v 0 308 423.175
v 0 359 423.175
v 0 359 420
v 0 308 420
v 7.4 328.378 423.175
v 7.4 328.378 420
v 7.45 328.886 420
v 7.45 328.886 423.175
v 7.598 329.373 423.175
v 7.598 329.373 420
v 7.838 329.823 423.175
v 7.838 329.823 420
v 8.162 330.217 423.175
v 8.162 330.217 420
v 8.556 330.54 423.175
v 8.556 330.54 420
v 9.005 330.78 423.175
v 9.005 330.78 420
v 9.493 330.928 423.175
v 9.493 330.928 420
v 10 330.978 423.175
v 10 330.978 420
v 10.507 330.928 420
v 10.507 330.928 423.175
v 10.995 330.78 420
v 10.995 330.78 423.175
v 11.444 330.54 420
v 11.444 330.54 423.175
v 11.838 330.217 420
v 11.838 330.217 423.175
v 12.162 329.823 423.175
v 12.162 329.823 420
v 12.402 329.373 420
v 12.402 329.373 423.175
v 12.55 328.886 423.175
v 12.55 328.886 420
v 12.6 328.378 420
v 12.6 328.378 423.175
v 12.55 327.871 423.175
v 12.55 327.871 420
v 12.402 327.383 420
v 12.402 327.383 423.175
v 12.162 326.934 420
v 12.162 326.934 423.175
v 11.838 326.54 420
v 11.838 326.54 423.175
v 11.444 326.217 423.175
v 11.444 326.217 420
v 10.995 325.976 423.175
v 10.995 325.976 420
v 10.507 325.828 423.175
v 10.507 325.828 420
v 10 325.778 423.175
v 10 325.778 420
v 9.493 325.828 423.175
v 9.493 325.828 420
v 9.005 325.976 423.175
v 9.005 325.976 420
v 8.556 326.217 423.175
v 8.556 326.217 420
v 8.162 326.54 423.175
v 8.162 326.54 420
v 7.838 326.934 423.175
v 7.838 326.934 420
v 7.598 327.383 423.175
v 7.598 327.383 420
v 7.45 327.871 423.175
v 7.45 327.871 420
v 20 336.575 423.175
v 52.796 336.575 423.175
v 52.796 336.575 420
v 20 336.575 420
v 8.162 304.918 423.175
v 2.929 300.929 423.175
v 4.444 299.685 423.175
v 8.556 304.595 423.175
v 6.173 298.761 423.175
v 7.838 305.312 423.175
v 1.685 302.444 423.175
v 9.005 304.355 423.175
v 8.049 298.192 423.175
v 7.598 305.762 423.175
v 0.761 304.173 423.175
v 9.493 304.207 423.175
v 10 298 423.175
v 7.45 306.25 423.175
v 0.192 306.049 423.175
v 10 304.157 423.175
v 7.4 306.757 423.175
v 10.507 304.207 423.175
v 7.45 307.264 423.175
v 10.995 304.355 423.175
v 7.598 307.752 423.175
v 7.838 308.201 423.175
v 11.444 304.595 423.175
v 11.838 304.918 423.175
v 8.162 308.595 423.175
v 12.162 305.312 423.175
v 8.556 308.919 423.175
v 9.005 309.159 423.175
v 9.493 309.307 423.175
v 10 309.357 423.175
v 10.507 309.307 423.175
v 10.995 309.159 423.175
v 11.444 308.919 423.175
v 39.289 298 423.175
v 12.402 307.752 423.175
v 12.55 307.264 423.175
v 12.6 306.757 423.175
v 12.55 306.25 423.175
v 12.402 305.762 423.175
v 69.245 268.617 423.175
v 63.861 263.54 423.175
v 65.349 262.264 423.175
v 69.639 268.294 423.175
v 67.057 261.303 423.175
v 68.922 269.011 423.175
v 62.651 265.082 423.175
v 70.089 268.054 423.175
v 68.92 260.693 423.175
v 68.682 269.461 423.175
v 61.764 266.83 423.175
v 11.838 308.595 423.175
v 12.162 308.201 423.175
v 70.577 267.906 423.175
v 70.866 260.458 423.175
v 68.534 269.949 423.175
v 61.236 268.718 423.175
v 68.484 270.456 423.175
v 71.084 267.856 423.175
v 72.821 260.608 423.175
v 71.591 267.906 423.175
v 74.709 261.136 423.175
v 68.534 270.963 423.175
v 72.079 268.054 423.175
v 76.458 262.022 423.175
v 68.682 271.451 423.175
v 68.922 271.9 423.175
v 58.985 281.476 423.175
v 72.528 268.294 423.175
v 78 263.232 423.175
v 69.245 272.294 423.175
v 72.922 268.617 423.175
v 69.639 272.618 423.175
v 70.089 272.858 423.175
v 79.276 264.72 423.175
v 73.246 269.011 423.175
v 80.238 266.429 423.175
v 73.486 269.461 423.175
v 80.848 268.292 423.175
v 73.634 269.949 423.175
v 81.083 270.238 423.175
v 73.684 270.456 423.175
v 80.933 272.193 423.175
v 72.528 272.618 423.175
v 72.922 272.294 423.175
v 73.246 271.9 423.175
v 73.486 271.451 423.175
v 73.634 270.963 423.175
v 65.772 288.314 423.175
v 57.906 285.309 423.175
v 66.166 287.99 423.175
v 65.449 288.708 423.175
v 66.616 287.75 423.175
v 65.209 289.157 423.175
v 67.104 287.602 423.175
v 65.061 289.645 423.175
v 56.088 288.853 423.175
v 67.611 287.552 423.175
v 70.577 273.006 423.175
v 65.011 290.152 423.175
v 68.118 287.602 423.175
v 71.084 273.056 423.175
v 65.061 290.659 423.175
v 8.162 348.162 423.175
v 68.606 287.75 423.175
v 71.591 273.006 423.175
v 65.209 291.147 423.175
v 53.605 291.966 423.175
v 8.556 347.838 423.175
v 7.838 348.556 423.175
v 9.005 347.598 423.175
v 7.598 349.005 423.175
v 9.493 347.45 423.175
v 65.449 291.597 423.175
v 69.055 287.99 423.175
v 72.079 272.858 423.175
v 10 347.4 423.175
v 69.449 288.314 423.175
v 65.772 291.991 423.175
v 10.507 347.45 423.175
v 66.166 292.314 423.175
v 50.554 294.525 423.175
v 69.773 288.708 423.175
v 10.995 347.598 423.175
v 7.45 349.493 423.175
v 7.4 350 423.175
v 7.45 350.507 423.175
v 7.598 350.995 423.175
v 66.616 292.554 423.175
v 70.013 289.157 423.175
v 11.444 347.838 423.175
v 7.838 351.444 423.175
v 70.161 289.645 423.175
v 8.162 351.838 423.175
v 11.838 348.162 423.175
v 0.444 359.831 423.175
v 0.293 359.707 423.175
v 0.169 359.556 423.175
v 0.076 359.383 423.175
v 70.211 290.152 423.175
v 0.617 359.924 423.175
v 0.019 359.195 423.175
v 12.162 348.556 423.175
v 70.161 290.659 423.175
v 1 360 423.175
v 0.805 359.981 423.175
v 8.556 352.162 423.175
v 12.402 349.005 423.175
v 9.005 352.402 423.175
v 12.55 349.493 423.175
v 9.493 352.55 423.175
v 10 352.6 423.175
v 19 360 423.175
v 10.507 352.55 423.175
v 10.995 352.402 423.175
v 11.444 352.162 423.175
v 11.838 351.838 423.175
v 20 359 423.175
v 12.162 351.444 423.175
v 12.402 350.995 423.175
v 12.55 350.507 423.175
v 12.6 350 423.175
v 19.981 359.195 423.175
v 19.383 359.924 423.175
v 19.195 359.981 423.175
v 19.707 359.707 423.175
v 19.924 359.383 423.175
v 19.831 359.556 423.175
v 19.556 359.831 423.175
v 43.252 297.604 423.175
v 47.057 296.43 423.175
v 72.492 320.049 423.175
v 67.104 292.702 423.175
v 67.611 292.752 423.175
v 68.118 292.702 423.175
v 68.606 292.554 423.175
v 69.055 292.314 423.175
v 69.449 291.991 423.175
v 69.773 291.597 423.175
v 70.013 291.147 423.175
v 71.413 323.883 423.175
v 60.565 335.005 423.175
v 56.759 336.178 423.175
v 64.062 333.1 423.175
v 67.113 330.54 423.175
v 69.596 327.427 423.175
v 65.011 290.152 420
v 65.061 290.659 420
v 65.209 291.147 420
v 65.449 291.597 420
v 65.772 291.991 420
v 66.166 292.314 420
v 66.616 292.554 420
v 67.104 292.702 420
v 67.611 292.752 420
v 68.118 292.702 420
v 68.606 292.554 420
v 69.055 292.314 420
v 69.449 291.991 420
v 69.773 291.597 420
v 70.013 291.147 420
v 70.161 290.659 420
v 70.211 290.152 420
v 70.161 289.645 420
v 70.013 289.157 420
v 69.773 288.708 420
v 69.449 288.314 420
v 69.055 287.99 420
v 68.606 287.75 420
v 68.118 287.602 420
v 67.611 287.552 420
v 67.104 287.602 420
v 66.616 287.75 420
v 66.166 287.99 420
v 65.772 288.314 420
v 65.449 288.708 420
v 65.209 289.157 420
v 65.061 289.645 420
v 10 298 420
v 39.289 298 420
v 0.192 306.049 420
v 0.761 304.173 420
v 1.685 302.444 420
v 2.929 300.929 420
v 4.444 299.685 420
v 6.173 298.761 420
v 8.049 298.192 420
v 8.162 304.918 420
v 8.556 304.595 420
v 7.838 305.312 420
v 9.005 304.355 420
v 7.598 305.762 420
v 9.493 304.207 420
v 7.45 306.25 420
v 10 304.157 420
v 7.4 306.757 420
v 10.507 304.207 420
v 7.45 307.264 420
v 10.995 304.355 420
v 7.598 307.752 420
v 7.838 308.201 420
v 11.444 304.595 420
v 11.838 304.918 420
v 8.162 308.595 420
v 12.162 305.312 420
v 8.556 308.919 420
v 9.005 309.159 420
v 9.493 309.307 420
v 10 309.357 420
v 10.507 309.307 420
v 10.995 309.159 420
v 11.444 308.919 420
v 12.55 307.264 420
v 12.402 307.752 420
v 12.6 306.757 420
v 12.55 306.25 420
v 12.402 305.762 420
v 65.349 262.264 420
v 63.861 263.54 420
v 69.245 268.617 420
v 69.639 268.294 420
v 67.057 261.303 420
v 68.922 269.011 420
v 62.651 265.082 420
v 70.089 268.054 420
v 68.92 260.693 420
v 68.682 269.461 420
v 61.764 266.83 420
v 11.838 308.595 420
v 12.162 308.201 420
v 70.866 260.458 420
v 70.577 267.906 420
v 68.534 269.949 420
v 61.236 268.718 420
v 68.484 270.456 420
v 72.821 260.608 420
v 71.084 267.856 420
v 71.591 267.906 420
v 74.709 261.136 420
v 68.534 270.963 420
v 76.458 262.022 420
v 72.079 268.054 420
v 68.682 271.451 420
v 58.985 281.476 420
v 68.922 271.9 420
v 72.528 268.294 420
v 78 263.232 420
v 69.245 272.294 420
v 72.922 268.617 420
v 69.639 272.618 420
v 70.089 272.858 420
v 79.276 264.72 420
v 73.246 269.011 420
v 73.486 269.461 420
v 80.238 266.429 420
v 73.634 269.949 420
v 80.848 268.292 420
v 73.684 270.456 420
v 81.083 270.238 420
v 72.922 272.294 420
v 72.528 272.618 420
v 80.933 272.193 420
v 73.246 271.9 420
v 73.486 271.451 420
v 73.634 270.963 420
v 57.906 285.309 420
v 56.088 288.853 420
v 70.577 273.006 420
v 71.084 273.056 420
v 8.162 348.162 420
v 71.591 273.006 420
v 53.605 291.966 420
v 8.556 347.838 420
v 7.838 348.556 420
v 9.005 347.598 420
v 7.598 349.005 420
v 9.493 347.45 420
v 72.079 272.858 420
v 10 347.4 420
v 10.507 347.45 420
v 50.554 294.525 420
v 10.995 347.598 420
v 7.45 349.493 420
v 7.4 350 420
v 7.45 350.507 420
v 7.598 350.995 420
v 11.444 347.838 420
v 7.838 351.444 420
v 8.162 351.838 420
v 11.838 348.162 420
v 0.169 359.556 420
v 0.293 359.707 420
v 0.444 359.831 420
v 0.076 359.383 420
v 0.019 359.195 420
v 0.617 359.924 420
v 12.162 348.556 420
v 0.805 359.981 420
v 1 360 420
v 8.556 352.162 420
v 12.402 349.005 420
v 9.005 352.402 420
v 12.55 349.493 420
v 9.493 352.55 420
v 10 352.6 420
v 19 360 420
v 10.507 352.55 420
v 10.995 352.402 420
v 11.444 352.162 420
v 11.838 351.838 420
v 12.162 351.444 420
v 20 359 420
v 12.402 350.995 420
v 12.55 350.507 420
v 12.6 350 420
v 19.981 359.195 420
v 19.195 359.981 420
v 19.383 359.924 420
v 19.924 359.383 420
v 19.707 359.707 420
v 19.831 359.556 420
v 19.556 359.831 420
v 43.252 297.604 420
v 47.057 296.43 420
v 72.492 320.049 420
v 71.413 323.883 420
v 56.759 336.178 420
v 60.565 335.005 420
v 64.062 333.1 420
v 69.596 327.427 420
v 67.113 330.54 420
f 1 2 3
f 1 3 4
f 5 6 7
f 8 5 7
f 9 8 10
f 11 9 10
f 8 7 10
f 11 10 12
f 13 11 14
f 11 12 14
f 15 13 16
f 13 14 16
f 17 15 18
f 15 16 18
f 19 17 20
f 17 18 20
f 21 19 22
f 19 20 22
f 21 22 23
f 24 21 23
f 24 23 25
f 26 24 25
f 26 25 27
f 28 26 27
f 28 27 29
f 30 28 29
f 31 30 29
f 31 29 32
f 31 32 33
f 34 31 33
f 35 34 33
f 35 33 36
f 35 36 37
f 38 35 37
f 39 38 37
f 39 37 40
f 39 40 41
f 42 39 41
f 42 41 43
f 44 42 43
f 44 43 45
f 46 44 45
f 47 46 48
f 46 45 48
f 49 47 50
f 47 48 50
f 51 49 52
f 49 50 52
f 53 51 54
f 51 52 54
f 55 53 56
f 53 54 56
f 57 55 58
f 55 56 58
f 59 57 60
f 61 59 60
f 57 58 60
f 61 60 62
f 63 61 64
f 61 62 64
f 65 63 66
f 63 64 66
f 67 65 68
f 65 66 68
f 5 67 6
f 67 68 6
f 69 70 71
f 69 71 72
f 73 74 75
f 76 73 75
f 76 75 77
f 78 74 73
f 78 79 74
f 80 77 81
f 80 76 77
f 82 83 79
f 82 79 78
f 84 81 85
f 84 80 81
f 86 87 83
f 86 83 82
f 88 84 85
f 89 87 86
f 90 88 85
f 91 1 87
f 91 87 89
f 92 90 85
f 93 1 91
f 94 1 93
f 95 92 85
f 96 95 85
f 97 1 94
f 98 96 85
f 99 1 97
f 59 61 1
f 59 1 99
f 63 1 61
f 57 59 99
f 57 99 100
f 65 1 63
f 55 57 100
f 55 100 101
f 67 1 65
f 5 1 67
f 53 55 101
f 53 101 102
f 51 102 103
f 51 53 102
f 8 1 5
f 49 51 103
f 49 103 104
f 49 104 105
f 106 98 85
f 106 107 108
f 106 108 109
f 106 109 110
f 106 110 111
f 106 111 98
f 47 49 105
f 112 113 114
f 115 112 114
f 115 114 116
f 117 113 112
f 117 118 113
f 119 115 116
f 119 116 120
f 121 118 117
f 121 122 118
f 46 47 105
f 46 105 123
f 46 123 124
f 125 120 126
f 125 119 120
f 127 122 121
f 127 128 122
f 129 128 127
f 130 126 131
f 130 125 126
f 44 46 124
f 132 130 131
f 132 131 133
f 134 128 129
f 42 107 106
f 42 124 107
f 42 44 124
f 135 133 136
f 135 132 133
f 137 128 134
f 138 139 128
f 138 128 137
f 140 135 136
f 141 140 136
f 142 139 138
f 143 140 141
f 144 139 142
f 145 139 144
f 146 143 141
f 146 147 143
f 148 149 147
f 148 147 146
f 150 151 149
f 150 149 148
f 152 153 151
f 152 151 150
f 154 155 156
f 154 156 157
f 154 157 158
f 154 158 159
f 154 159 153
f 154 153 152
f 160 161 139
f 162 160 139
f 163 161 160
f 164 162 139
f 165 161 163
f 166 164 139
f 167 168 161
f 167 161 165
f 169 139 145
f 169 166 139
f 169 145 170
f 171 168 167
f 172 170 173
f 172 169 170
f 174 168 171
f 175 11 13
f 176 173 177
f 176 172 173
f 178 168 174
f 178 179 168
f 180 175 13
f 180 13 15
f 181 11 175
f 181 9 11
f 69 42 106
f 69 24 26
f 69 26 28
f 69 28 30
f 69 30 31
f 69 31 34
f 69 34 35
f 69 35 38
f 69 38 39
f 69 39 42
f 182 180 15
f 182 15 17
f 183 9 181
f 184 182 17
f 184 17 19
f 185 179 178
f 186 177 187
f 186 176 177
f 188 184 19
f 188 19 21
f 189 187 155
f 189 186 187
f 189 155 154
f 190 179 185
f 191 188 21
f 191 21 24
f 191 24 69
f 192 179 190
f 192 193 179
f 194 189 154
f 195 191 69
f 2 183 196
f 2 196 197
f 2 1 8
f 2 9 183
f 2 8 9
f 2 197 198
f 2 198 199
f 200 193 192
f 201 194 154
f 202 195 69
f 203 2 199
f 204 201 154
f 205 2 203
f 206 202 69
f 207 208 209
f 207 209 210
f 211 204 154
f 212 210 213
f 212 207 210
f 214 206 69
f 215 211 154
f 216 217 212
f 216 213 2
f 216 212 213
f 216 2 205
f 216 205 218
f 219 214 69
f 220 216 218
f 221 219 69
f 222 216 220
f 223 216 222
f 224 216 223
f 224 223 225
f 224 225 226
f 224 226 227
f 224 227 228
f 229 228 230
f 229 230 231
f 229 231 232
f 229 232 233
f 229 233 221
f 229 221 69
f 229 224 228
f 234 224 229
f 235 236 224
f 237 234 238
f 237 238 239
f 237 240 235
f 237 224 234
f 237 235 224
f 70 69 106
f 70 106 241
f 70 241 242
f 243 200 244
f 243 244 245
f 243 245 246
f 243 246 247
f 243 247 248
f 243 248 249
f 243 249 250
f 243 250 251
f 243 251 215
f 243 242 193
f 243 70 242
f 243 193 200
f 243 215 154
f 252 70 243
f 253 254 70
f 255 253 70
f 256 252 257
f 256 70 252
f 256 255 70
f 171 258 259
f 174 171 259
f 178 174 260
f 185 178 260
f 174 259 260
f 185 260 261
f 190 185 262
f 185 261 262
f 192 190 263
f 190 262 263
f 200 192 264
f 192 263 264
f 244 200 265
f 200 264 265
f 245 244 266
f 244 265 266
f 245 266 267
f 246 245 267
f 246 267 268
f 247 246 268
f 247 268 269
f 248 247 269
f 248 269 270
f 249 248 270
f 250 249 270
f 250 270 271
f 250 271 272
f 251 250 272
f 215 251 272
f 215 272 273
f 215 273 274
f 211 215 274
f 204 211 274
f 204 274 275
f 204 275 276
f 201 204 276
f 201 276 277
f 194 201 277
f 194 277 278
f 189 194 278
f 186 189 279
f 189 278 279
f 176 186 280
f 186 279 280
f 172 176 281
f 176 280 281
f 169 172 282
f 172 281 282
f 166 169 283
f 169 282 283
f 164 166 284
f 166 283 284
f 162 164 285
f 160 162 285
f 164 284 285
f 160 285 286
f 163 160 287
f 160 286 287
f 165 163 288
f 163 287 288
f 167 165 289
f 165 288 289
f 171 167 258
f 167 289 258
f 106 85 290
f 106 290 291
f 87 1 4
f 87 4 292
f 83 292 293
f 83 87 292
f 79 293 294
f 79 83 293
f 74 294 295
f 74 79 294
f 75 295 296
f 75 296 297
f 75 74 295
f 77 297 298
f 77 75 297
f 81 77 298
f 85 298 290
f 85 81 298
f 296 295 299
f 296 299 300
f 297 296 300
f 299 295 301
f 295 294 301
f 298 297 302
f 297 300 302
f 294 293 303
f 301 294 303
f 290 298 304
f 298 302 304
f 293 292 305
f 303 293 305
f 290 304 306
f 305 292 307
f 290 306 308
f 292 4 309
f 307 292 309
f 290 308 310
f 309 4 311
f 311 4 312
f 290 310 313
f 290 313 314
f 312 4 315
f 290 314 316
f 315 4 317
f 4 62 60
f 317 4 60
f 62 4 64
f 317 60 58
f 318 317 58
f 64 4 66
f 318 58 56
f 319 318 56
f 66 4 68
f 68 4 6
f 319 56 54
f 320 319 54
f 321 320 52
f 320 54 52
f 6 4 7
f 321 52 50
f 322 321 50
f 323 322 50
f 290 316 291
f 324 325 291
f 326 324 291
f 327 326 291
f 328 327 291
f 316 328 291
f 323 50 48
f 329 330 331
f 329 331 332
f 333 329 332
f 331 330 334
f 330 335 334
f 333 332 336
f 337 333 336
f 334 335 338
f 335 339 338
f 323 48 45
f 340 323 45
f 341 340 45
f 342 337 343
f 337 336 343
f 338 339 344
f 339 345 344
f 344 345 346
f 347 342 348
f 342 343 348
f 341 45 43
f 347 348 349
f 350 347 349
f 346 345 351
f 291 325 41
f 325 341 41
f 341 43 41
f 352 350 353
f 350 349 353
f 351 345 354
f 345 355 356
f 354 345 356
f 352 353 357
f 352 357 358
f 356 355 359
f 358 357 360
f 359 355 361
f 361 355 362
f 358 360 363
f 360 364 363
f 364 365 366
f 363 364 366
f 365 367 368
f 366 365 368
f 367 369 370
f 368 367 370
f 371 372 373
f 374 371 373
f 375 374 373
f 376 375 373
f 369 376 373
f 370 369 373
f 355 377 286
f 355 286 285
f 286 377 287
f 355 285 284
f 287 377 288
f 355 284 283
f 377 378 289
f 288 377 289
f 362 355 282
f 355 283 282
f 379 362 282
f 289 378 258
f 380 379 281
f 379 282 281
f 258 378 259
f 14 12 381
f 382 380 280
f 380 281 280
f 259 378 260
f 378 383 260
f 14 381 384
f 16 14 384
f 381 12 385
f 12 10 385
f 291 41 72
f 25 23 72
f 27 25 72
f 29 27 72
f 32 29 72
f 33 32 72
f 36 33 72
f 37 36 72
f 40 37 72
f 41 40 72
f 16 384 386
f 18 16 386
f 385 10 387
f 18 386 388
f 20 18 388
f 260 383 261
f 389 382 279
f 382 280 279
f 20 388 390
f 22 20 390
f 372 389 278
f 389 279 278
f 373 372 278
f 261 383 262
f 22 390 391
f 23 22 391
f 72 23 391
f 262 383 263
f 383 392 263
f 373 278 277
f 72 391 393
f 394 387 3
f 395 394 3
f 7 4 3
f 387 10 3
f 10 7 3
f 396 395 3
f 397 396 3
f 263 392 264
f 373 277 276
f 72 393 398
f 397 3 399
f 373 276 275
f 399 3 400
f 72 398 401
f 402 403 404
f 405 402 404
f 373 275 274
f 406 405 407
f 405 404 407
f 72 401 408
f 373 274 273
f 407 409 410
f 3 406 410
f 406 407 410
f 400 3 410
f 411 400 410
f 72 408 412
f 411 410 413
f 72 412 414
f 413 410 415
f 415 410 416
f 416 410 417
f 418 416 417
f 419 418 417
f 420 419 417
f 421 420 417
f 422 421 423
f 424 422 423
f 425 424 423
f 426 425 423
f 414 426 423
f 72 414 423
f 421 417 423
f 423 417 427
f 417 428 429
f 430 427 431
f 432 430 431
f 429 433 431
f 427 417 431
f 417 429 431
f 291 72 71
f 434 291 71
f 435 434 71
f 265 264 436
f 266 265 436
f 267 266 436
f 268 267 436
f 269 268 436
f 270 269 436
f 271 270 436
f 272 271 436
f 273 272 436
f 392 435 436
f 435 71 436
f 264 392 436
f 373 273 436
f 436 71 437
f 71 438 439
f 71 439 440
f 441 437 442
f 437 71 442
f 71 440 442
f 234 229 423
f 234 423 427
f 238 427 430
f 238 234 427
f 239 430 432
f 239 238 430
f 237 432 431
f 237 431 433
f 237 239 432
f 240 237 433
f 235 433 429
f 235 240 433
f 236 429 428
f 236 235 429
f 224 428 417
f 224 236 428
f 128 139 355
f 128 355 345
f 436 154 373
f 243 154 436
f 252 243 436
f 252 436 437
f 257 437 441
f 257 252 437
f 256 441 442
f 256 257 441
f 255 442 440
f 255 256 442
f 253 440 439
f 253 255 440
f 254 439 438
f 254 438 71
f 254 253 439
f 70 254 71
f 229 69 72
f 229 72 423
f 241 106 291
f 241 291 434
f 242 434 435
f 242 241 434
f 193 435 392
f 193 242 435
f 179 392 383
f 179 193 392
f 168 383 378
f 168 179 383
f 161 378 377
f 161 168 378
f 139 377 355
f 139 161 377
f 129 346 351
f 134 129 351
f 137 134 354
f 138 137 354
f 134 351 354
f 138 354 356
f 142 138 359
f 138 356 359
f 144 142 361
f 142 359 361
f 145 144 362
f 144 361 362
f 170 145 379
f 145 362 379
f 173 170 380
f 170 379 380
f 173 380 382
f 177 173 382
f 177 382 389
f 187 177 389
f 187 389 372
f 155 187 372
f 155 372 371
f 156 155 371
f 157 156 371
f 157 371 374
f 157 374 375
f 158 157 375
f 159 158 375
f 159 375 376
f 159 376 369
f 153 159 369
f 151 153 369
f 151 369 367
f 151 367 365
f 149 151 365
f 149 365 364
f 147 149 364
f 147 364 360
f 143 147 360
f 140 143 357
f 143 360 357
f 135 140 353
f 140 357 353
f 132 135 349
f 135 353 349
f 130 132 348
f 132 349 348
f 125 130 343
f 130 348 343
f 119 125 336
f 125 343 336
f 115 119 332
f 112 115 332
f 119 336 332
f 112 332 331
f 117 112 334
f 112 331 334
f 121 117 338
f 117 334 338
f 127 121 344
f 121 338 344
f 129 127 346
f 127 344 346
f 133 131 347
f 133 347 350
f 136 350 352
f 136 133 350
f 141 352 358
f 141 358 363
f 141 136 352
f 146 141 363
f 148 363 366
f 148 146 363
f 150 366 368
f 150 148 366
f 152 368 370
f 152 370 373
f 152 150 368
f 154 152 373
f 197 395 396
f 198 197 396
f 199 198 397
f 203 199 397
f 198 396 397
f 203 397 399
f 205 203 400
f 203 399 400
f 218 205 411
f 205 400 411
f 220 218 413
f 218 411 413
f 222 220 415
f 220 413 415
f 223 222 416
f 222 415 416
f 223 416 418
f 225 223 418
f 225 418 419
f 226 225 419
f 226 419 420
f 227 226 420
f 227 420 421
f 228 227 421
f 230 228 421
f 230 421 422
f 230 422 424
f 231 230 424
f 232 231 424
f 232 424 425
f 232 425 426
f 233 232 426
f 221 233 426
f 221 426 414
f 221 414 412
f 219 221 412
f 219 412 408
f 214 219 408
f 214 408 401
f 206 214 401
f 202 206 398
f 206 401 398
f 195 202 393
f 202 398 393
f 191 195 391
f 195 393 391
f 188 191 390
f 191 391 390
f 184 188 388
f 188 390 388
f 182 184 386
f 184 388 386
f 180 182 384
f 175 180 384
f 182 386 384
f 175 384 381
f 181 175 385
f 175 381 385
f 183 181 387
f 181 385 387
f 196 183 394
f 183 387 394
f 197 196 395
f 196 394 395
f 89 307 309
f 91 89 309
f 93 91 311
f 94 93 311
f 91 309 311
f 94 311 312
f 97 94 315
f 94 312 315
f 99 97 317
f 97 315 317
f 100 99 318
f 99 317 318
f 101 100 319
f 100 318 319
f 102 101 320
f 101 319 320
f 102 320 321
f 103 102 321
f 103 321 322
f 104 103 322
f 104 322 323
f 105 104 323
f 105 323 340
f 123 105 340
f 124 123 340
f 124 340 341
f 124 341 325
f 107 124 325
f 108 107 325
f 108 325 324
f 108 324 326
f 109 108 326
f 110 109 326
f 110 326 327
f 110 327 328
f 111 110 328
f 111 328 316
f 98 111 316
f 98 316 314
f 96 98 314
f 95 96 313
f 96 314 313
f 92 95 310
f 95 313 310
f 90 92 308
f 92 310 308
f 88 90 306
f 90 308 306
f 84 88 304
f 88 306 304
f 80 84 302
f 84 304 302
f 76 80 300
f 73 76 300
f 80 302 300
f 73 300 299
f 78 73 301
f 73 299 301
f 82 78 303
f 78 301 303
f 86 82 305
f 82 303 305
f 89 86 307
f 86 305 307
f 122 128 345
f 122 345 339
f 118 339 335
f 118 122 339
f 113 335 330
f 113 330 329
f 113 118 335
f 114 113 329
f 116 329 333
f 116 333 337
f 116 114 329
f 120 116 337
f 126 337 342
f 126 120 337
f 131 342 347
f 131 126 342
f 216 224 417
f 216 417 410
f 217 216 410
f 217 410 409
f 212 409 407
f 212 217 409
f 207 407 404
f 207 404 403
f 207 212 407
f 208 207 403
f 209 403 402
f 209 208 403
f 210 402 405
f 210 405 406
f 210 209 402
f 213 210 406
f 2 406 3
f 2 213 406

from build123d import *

# Parameters (mm, degrees)
BASE_FLANGE1_DEPTH         = 3.175
F_5_2_5_2_DIAMETER_HOLE1_D = 5.2


# Sheet-metal steps are written as plain solids
with BuildPart() as part:
    # Sketch11 → Base-Flange1 (new body)
    with BuildSketch(Plane.XY.offset(423.175)):
        with BuildLine():
            Line((80.932869831, 272.193100025), (72.492212082, 320.048916024))
            ThreePointArc((72.492212082, 320.048916024), (65.651606735, 331.8961997), (52.796224992, 336.575))
            Line((52.796224992, 336.575), (20, 336.575))
            Line((20, 336.575), (20, 359))
            ThreePointArc((20, 359), (19.707106781, 359.707106781), (19, 360))
            Line((19, 360), (1, 360))
            ThreePointArc((1, 360), (0.292893219, 359.707106781), (0, 359))
            Line((0, 359), (0, 308))
            ThreePointArc((0, 308), (2.928932188, 300.928932188), (10, 298))
            Line((10, 298), (39.289001969, 298))
            ThreePointArc((39.289001969, 298), (52.143642752, 293.321821378), (58.984652965, 281.475821034))
            Line((58.984652965, 281.475821034), (61.236098321, 268.718063502))
            ThreePointArc((61.236098321, 268.718063502), (65.348951759, 262.263898856), (72.820881831, 260.607980474))
            ThreePointArc((72.820881831, 260.607980474), (79.276674092, 264.720773785), (80.932869831, 272.193100025))
        make_face()
    extrude(amount=-BASE_FLANGE1_DEPTH)

    # Ø5.2 (5.2) Diameter Hole1 (through all)
    with Locations(Plane.XY.offset(423.175)):
        with Locations((67.610960265, 290.15212908), (10, 349.9999998), (10, 328.3784093), (10, 306.7568188), (71.083923819, 270.455974019)):
            Hole(F_5_2_5_2_DIAMETER_HOLE1_D / 2)


solid = part.part
